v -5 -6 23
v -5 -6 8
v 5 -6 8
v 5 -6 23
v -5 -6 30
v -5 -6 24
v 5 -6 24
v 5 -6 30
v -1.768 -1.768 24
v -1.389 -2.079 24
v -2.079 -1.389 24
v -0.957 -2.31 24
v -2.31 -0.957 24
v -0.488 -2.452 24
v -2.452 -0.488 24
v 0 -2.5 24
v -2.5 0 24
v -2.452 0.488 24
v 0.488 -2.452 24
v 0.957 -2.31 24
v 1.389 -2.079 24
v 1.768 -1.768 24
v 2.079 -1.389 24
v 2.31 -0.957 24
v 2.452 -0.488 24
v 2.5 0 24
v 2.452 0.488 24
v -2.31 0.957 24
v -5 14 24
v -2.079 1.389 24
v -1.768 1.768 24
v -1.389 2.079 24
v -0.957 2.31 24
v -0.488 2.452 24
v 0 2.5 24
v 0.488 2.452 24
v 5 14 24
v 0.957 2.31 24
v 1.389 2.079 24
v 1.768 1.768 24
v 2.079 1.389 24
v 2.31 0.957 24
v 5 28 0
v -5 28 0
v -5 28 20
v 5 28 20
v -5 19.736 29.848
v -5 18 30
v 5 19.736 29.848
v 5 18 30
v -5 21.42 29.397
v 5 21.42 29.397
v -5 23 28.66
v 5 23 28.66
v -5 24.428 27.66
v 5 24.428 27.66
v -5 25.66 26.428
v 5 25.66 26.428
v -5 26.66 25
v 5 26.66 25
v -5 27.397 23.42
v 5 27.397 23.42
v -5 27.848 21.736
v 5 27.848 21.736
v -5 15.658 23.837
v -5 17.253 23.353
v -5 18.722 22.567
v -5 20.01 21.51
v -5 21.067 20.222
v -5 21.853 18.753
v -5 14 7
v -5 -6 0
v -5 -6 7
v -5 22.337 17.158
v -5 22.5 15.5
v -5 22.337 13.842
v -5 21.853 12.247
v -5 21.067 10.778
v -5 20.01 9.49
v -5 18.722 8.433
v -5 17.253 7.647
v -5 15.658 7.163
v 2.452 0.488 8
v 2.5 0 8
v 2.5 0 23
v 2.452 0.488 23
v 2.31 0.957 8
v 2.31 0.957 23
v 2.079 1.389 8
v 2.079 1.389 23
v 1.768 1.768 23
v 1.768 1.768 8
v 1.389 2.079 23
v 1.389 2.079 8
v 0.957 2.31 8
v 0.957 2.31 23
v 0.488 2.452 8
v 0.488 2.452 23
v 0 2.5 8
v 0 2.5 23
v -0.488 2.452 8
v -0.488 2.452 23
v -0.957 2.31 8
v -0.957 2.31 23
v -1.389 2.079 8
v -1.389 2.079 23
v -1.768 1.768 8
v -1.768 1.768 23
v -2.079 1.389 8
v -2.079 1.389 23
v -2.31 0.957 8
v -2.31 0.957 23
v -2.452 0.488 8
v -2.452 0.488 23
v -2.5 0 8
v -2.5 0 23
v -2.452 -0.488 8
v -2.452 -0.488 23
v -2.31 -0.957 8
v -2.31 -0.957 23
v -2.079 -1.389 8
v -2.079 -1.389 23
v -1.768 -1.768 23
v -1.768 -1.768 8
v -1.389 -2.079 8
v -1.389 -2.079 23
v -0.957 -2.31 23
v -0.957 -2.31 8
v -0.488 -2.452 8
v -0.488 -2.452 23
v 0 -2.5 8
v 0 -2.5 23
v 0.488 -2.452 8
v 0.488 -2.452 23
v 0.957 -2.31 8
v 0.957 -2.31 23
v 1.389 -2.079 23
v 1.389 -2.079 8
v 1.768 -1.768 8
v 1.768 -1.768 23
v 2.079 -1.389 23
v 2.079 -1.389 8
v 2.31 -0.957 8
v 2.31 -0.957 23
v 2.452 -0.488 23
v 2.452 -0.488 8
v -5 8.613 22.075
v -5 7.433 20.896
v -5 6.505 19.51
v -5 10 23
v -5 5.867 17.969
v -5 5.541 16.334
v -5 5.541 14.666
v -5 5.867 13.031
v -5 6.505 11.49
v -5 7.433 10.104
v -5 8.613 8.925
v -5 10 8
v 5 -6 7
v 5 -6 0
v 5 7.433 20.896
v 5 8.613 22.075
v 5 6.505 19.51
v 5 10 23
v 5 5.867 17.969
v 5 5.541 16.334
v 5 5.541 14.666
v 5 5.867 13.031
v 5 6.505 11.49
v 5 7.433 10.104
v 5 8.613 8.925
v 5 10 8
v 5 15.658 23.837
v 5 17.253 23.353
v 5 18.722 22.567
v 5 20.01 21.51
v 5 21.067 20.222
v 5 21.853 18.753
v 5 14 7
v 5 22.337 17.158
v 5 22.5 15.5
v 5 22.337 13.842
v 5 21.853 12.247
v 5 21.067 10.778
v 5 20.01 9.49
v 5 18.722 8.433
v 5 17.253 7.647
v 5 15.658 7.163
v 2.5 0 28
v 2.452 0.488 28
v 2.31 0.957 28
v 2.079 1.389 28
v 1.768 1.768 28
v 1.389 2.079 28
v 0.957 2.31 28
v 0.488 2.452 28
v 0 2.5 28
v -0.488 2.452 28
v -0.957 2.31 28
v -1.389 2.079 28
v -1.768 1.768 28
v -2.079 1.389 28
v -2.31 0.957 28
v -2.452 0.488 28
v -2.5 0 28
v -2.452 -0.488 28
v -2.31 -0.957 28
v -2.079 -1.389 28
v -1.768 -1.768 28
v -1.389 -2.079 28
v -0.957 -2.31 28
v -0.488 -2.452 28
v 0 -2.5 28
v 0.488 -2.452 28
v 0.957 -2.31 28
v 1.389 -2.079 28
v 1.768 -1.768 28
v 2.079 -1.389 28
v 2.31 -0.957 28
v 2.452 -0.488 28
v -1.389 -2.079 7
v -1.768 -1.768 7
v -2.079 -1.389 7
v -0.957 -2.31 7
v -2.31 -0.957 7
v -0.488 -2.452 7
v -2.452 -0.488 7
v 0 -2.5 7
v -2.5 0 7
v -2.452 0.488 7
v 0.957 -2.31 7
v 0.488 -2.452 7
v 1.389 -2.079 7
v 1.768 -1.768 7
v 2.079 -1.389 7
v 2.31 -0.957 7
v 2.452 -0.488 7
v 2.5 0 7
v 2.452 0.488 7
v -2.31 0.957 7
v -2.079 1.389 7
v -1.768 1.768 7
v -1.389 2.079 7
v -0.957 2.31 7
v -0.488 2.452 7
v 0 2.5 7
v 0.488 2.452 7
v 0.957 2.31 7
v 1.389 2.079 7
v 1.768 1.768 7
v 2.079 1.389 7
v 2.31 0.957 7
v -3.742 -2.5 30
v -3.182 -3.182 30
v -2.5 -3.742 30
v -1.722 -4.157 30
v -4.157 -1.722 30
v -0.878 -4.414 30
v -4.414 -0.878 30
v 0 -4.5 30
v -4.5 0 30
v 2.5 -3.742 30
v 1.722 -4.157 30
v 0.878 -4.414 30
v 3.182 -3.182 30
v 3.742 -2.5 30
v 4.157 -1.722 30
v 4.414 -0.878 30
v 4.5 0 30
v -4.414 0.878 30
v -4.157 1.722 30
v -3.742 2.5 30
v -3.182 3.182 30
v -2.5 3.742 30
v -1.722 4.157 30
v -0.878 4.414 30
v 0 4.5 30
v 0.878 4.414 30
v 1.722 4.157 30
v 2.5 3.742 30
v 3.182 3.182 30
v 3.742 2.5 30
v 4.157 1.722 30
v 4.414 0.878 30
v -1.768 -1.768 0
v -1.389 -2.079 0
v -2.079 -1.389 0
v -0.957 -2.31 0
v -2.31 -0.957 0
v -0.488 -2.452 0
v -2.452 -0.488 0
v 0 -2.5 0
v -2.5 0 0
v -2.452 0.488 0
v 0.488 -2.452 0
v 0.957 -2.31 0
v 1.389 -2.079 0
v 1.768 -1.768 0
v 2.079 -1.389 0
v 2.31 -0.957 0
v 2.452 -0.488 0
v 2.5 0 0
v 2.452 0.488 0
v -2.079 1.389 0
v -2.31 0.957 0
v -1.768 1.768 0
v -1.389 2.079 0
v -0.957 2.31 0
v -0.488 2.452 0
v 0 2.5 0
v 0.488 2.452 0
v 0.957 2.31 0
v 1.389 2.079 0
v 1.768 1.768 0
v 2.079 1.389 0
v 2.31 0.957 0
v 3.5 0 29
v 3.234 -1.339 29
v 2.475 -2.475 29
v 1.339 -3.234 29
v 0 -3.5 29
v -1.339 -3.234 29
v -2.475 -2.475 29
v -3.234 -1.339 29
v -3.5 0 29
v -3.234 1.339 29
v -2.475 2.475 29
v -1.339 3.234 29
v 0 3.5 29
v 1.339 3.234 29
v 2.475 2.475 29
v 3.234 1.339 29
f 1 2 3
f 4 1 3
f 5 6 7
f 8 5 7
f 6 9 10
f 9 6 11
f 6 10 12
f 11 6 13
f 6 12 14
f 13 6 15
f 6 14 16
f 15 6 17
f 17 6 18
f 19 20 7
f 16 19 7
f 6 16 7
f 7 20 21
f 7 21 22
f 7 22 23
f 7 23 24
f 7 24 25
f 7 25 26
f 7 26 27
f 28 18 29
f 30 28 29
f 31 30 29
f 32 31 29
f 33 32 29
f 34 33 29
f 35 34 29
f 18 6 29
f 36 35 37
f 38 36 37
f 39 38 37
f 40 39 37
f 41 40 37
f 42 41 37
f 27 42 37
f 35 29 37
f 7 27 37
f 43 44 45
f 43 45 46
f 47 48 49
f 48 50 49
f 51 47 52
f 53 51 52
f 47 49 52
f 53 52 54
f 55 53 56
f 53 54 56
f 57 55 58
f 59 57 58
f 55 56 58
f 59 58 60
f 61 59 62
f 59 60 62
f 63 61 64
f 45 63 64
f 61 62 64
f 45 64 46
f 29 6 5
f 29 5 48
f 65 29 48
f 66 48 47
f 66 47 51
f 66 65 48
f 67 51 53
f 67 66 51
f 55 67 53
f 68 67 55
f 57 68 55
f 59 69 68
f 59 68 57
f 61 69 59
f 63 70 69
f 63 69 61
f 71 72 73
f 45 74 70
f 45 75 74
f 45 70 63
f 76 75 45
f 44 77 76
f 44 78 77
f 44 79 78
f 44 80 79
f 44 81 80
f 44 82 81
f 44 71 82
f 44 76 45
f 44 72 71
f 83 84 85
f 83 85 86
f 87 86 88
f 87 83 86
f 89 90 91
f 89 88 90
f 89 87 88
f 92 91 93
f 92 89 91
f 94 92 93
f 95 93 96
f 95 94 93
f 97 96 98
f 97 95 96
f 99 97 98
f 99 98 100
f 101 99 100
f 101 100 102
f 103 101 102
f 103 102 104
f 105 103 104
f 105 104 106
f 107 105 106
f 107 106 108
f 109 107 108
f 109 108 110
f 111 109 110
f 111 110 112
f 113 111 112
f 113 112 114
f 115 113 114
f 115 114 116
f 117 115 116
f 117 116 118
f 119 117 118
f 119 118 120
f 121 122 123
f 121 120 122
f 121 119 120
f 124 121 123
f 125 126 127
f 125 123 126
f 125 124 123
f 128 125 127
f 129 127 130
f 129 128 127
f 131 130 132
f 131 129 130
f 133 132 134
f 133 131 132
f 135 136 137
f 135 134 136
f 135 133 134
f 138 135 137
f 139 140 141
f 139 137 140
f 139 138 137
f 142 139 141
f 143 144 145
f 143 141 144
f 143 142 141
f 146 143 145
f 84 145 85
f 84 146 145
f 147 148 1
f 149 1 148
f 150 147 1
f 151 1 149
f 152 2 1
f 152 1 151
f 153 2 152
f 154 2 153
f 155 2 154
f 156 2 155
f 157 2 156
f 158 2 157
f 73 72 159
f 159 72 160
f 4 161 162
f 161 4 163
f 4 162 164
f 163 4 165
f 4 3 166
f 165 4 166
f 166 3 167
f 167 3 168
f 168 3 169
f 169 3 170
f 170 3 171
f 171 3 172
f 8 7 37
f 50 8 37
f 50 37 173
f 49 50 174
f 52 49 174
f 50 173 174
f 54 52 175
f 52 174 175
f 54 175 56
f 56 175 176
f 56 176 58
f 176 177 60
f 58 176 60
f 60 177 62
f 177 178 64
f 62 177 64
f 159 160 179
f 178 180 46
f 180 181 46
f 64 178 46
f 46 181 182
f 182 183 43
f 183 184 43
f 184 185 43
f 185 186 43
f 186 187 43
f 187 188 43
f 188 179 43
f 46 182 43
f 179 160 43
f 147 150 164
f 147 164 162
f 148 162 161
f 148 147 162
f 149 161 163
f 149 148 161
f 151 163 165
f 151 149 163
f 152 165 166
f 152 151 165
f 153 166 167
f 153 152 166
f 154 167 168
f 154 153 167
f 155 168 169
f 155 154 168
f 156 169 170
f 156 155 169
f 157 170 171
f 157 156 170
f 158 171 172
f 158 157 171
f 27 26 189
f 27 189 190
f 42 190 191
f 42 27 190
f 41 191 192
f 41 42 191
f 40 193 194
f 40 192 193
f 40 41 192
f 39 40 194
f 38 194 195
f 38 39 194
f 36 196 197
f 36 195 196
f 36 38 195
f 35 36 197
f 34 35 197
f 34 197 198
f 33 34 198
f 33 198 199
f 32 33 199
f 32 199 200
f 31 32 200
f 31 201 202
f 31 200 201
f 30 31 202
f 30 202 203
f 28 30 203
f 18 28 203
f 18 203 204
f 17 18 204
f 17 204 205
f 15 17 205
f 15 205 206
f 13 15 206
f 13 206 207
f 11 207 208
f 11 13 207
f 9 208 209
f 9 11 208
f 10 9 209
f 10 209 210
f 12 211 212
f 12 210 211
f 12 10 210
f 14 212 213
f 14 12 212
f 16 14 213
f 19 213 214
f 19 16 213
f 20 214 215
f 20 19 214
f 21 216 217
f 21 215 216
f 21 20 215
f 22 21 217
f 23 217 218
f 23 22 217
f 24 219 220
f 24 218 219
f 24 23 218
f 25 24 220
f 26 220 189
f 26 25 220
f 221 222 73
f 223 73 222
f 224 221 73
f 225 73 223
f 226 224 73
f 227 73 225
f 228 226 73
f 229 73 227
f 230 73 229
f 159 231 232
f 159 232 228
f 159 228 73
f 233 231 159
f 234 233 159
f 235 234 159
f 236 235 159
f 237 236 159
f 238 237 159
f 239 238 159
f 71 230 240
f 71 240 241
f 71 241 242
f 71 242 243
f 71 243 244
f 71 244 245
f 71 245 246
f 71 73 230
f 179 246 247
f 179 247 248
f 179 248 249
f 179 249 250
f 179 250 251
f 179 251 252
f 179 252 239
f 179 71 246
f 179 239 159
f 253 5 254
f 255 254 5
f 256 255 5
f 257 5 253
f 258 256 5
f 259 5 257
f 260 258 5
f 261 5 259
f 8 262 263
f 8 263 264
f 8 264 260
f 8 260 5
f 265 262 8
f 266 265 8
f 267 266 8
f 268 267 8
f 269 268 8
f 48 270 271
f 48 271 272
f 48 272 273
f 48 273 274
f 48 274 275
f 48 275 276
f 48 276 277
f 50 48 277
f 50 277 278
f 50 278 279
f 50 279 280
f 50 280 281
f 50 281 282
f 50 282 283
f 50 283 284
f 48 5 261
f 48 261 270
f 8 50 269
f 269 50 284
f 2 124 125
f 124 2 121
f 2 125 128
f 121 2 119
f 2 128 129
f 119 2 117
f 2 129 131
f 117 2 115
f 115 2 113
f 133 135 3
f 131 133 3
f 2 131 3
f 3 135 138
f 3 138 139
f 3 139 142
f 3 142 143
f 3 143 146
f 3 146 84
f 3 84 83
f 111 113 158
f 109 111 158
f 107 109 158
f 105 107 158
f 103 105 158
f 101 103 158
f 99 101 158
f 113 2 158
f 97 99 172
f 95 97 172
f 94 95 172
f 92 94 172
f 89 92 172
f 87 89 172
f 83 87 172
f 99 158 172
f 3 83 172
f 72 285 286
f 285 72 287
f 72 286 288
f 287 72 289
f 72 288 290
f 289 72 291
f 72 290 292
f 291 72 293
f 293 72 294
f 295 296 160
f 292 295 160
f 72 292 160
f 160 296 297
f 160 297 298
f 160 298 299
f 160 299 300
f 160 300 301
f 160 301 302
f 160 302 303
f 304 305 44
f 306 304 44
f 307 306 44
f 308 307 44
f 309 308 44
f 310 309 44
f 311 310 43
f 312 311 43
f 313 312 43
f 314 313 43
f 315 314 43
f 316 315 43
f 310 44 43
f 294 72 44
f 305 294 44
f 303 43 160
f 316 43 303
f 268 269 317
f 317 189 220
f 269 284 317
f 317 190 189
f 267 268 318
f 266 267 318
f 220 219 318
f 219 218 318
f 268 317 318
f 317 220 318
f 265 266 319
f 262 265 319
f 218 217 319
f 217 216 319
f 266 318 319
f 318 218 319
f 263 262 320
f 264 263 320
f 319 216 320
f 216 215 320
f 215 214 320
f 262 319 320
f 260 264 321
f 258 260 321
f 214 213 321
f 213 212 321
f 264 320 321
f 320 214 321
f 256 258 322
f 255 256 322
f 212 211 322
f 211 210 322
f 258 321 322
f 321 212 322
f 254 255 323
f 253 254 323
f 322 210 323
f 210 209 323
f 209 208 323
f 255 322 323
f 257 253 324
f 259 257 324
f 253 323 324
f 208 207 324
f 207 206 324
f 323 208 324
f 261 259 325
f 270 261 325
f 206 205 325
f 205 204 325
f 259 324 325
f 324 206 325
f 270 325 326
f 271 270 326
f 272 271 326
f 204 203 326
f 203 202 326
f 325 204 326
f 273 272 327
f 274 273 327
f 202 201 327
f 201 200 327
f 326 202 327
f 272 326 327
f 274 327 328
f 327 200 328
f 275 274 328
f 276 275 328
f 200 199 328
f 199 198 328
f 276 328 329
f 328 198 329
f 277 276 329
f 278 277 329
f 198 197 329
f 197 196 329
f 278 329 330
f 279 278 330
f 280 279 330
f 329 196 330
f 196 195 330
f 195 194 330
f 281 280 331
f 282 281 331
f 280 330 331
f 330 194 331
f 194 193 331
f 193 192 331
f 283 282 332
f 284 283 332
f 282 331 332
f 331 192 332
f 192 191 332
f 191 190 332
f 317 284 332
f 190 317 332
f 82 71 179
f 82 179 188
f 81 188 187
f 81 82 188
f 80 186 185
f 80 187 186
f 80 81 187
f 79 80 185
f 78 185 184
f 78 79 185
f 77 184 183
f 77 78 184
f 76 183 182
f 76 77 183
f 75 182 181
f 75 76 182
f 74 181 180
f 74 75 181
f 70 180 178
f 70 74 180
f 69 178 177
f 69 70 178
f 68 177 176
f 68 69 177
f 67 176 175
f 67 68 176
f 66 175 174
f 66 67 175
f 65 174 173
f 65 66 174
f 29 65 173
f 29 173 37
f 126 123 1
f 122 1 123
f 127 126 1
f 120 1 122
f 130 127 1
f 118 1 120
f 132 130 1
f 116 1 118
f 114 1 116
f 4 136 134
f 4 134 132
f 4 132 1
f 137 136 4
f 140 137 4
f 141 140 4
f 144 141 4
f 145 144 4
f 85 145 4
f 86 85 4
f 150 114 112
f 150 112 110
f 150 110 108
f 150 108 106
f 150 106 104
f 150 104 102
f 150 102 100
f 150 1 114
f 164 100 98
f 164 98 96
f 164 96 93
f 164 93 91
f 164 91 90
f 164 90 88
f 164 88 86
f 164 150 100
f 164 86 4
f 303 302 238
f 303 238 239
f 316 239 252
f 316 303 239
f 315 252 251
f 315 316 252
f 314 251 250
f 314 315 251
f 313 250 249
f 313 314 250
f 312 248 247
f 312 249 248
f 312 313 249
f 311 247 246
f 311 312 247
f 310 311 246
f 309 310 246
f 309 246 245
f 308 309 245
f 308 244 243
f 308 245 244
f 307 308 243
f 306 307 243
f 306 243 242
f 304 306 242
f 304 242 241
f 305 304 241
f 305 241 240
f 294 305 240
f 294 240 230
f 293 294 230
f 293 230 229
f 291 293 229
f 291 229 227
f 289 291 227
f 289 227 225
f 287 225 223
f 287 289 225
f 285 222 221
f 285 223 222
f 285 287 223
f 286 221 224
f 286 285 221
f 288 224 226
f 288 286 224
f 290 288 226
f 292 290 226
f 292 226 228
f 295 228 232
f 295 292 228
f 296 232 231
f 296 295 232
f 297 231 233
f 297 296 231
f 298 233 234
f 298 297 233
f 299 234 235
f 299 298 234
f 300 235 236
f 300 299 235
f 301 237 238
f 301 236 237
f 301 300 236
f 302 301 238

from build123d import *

# Parameters (mm, degrees)
CYLINDER001_R           = 8.5
CYLINDER001_DEPTH       = 30
CYLINDER001_PITCH_ANGLE = 90
CYLINDER_R              = 2.5
CYLINDER_DEPTH          = 37
BOX001_W                = 15
BOX001_H                = 20
BOX001_DEPTH            = 17
BOX_W                   = 10
BOX_H                   = 34
BOX_DEPTH               = 30
CHAMFER_SIZE            = 2
FILLET_R                = 10
CYLINDER003_R           = 2.5
CYLINDER003_DEPTH       = 37
CYLINDER002_R           = 8.5
CYLINDER002_DEPTH       = 30
CYLINDER002_PITCH_ANGLE = 90
BOX002_W                = 10
BOX002_H                = 20
BOX002_DEPTH            = 15


with BuildPart() as cylinder001:
    # Cylinder001 → Cylinder001 (new body)
    with BuildSketch(Plane.XY):
        Circle(CYLINDER001_R)
    extrude(amount=CYLINDER001_DEPTH)


with BuildPart() as cylinder001_1:
    # Cylinder001 pitch: moved
    add(cylinder001.part.rotate(Axis((0, 0, 0), (0, 1, 0)), CYLINDER001_PITCH_ANGLE))


with BuildPart() as cylinder001_2:
    # Cylinder001 placement: moved
    add(cylinder001_1.part.moved(Location((-14, 14, 15.5))))


with BuildPart() as cylinder:
    # Cylinder → Cylinder (new body)
    with BuildSketch(Plane.XY.offset(-1)):
        Circle(CYLINDER_R)
    extrude(amount=CYLINDER_DEPTH)


with BuildPart() as fusion:
    # Box001 → Box001 (new body)
    with BuildSketch(Plane(origin=(-7, -6, 7), x_dir=(1, 0, 0), z_dir=(0, 0, 1))):
        with Locations((7.5, 10)):
            Rectangle(BOX001_W, BOX001_H)
    extrude(amount=BOX001_DEPTH)

    # Fusion: union Cylinder001, Cylinder
    add(cylinder001_2.part)
    add(cylinder.part)


with BuildPart() as fillet_body:
    # Box → Box (new body)
    with BuildSketch(Plane(origin=(-5, -6, 0), x_dir=(1, 0, 0), z_dir=(0, 0, 1))):
        with Locations((5, 17)):
            Rectangle(BOX_W, BOX_H)
    extrude(amount=BOX_DEPTH)

    # Cut: cut Fusion
    add(fusion.part, mode=Mode.SUBTRACT)

    # Chamfer
    chamfer_edges = [fillet_body.edges().sort_by_distance(p)[0] for p in [
        (-2.5, 0, 30),
    ]]
    chamfer(chamfer_edges, length=CHAMFER_SIZE)

    # Fillet
    fillet_edges = [fillet_body.edges().sort_by_distance(p)[0] for p in [
        (0, 28, 30),
    ]]
    fillet(fillet_edges, radius=FILLET_R)


with BuildPart() as cylinder003:
    # Cylinder003 → Cylinder003 (new body)
    with BuildSketch(Plane.XY.offset(-1)):
        Circle(CYLINDER003_R)
    extrude(amount=CYLINDER003_DEPTH)


with BuildPart() as fusion001:
    # Cylinder002 → Cylinder002 (new body)
    with BuildSketch(Plane.XY):
        Circle(CYLINDER002_R)
    extrude(amount=CYLINDER002_DEPTH)


with BuildPart() as fusion001_1:
    # Cylinder002 pitch: moved
    add(fusion001.part.rotate(Axis((0, 0, 0), (0, 1, 0)), CYLINDER002_PITCH_ANGLE))


with BuildPart() as fusion001_2:
    # Cylinder002 placement: moved
    add(fusion001_1.part.moved(Location((-14, 14, 15.5))))

    # Fusion001: union Cylinder003
    add(cylinder003.part)


with BuildPart() as cut001:
    # Box002 → Box002 (new body)
    with BuildSketch(Plane(origin=(-5, -6, 8), x_dir=(1, 0, 0), z_dir=(0, 0, 1))):
        with Locations((5, 10)):
            Rectangle(BOX002_W, BOX002_H)
    extrude(amount=BOX002_DEPTH)

    # Cut001: cut Fusion001
    add(fusion001_2.part, mode=Mode.SUBTRACT)


solid = Compound([fillet_body.part, cut001.part])
